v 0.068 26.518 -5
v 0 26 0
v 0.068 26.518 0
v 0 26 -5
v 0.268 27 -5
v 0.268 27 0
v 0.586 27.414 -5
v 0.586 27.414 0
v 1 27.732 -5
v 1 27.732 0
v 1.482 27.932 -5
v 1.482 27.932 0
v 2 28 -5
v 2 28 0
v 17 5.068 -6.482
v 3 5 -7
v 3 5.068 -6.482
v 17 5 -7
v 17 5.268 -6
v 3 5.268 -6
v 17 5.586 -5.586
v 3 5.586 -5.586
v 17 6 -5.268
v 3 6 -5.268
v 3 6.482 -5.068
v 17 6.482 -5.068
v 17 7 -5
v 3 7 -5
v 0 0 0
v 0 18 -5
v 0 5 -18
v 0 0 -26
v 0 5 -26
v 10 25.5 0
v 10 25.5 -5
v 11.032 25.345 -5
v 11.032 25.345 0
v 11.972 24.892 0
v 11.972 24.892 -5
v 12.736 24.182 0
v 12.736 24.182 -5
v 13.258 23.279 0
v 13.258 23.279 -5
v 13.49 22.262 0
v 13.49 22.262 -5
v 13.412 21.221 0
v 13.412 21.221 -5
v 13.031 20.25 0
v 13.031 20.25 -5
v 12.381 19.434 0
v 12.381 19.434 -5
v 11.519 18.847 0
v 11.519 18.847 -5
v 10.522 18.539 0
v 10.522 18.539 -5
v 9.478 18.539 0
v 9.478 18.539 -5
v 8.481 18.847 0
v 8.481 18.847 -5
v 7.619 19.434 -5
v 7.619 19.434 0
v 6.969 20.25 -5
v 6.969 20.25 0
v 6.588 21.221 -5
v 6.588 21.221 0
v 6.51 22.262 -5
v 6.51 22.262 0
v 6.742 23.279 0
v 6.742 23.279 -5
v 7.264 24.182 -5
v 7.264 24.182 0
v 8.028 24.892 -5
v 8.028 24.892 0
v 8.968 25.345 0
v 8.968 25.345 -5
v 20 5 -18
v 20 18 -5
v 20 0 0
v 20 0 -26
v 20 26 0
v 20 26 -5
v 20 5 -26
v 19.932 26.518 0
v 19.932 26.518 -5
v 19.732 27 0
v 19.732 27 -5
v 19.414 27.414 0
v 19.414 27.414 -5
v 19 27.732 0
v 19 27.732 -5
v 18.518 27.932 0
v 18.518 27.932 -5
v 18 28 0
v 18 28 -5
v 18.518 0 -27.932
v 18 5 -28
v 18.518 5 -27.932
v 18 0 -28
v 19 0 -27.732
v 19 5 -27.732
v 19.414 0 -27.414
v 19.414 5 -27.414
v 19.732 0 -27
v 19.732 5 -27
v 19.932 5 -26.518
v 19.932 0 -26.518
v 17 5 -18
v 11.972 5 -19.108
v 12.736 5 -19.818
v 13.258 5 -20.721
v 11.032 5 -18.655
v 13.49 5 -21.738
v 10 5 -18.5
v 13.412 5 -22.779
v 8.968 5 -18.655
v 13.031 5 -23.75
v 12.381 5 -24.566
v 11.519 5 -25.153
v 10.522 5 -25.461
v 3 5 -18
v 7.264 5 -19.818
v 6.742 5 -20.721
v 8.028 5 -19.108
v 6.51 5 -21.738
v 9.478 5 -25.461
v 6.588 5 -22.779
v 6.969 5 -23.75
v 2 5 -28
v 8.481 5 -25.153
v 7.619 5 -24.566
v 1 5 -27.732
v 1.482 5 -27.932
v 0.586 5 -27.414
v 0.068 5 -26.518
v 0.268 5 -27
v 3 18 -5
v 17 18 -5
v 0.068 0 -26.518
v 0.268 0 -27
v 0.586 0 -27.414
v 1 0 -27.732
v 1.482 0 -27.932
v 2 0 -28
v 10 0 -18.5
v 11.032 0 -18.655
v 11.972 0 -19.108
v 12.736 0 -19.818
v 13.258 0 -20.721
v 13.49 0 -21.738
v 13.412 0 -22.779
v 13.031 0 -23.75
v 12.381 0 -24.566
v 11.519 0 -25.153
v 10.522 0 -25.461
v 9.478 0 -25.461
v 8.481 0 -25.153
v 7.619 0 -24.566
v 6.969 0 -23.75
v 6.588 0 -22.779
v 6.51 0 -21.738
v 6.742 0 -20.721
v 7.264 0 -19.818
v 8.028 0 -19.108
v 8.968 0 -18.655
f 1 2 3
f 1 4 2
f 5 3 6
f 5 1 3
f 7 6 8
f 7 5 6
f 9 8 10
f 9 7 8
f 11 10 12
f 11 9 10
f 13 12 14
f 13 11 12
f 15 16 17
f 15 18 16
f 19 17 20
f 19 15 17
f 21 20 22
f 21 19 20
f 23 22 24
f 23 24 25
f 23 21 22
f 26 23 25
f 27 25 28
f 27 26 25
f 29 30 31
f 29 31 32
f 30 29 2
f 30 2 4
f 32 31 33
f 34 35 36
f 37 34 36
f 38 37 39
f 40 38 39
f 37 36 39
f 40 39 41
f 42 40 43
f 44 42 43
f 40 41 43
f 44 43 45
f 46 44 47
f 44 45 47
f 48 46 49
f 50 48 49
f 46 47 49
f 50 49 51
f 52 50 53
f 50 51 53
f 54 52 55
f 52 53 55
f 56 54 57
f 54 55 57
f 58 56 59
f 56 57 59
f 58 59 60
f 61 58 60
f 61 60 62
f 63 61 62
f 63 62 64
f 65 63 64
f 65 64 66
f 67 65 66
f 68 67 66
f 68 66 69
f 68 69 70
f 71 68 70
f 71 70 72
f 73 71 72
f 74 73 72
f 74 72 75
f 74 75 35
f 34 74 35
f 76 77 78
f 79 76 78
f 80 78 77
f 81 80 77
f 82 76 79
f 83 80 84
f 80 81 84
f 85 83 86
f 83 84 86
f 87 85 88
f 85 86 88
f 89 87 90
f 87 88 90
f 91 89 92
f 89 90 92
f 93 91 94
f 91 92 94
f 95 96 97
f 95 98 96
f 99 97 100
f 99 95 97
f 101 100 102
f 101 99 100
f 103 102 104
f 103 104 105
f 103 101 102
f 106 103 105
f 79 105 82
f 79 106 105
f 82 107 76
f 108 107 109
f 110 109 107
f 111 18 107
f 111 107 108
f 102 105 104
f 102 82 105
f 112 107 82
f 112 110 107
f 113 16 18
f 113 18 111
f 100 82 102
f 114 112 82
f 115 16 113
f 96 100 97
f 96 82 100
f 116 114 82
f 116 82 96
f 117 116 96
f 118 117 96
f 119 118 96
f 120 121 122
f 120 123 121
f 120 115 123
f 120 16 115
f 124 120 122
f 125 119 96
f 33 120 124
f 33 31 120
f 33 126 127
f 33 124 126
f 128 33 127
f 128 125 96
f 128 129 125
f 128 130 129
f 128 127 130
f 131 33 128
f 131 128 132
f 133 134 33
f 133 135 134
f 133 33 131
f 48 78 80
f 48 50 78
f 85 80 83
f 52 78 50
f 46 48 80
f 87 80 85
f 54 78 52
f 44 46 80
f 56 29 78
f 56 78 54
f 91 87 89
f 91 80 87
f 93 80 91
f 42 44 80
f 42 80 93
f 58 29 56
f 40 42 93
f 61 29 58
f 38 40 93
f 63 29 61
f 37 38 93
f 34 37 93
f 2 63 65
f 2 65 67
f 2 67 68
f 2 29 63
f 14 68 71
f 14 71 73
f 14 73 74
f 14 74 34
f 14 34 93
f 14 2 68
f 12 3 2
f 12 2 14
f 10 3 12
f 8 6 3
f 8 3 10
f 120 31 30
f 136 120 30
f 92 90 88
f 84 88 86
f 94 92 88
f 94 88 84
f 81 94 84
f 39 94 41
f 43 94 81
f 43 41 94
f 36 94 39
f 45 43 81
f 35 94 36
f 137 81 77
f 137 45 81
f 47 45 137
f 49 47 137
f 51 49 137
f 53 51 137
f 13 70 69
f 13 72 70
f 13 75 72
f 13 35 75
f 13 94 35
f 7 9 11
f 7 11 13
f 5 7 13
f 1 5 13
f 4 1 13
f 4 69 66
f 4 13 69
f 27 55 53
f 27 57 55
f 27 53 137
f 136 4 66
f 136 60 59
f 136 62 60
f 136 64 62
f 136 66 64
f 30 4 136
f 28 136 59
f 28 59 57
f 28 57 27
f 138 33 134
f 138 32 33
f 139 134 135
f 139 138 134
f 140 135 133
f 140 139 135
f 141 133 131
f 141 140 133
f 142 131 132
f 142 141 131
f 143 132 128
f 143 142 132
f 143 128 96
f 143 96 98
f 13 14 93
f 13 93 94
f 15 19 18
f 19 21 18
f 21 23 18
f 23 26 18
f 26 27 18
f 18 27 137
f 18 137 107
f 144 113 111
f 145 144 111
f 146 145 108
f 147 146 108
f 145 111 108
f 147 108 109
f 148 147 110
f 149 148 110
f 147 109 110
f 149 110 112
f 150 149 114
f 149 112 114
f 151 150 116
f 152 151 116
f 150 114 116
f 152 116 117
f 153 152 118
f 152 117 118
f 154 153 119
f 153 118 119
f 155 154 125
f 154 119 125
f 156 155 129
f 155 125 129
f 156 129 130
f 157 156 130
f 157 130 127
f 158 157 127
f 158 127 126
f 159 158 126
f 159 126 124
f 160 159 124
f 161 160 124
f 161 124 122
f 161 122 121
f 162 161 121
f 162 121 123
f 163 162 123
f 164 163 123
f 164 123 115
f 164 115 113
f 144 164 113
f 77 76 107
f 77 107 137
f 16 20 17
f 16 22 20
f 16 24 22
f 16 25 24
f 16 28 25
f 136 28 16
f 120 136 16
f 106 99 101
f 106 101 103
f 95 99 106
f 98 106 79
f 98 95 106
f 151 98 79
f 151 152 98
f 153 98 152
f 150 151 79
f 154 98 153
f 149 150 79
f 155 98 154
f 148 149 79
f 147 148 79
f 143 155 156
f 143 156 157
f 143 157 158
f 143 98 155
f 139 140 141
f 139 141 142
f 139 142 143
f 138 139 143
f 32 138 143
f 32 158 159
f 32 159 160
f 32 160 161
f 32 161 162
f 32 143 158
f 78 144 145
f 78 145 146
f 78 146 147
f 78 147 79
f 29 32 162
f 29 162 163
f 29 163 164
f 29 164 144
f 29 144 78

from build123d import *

# Parameters (mm, degrees)
BOSS_EXTRUDE3_DEPTH = 20
BOSS_EXTRUDE4_DEPTH = 3
BOSS_EXTRUDE5_DEPTH = 3
FILLET5_R           = 2
CUT_EXTRUDE1_REACH  = 43.388
SKETCH6_R           = 3.5
CUT_EXTRUDE2_REACH  = 43.388
SKETCH7_R           = 3.5


with BuildPart() as part:
    # Sketch3 → Boss-Extrude3 (new body)
    with BuildSketch(Plane(origin=(0, 0, 0), x_dir=(0, 0, -1), z_dir=(1, 0, 0))):
        Polygon((0, 0), (0, 28), (5, 28), (5, 5), (28, 5), (28, 0), align=None)
    extrude(amount=BOSS_EXTRUDE3_DEPTH)

    # Sketch4 → Boss-Extrude4 (add)
    with BuildSketch(Plane(origin=(20, 0, 0), x_dir=(0, 0, -1), z_dir=(1, 0, 0))):
        Polygon((5, 18), (5, 5), (18, 5), align=None)
    extrude(amount=-BOSS_EXTRUDE4_DEPTH)

    # Sketch5 → Boss-Extrude5 (add)
    with BuildSketch(Plane.ZY):
        Polygon((-5, 18), (-5, 5), (-18, 5), align=None)
    extrude(amount=-BOSS_EXTRUDE5_DEPTH)

    # Fillet5
    fillet5_edges = [part.edges().sort_by_distance(p)[0] for p in [
        (20, 28, -2.5),
        (10, 5, -5),
        (0, 28, -2.5),
        (0, 2.5, -28),
        (20, 2.5, -28),
    ]]
    fillet(fillet5_edges, radius=FILLET5_R)

    # Sketch6 → Cut-Extrude1 (cut, up to next)
    with BuildSketch(Plane(origin=(0, 0, -5), x_dir=(-1, 0, 0), z_dir=(0, 0, -1)), mode=Mode.PRIVATE) as cut_extrude1_sk1:
        with Locations(Location((-10, 22, 0), (0, 0, 90))):
            Circle(SKETCH6_R)
    cut_extrude1_tool1 = extrude(cut_extrude1_sk1.sketch, amount=-CUT_EXTRUDE1_REACH, mode=Mode.PRIVATE) & part.part
    add(cut_extrude1_tool1.solids().sort_by_distance((10, 22, -5))[0], mode=Mode.SUBTRACT)

    # Sketch7 → Cut-Extrude2 (cut, up to next)
    with BuildSketch(Plane(origin=(0, 5, 0), x_dir=(1, 0, 0), z_dir=(0, 1, 0)), mode=Mode.PRIVATE) as cut_extrude2_sk1:
        with Locations(Location((10, 22, 0), (0, 0, 270))):
            Circle(SKETCH7_R)
    cut_extrude2_tool1 = extrude(cut_extrude2_sk1.sketch, amount=-CUT_EXTRUDE2_REACH, mode=Mode.PRIVATE) & part.part
    add(cut_extrude2_tool1.solids().sort_by_distance((10, 5, -22))[0], mode=Mode.SUBTRACT)


solid = part.part
